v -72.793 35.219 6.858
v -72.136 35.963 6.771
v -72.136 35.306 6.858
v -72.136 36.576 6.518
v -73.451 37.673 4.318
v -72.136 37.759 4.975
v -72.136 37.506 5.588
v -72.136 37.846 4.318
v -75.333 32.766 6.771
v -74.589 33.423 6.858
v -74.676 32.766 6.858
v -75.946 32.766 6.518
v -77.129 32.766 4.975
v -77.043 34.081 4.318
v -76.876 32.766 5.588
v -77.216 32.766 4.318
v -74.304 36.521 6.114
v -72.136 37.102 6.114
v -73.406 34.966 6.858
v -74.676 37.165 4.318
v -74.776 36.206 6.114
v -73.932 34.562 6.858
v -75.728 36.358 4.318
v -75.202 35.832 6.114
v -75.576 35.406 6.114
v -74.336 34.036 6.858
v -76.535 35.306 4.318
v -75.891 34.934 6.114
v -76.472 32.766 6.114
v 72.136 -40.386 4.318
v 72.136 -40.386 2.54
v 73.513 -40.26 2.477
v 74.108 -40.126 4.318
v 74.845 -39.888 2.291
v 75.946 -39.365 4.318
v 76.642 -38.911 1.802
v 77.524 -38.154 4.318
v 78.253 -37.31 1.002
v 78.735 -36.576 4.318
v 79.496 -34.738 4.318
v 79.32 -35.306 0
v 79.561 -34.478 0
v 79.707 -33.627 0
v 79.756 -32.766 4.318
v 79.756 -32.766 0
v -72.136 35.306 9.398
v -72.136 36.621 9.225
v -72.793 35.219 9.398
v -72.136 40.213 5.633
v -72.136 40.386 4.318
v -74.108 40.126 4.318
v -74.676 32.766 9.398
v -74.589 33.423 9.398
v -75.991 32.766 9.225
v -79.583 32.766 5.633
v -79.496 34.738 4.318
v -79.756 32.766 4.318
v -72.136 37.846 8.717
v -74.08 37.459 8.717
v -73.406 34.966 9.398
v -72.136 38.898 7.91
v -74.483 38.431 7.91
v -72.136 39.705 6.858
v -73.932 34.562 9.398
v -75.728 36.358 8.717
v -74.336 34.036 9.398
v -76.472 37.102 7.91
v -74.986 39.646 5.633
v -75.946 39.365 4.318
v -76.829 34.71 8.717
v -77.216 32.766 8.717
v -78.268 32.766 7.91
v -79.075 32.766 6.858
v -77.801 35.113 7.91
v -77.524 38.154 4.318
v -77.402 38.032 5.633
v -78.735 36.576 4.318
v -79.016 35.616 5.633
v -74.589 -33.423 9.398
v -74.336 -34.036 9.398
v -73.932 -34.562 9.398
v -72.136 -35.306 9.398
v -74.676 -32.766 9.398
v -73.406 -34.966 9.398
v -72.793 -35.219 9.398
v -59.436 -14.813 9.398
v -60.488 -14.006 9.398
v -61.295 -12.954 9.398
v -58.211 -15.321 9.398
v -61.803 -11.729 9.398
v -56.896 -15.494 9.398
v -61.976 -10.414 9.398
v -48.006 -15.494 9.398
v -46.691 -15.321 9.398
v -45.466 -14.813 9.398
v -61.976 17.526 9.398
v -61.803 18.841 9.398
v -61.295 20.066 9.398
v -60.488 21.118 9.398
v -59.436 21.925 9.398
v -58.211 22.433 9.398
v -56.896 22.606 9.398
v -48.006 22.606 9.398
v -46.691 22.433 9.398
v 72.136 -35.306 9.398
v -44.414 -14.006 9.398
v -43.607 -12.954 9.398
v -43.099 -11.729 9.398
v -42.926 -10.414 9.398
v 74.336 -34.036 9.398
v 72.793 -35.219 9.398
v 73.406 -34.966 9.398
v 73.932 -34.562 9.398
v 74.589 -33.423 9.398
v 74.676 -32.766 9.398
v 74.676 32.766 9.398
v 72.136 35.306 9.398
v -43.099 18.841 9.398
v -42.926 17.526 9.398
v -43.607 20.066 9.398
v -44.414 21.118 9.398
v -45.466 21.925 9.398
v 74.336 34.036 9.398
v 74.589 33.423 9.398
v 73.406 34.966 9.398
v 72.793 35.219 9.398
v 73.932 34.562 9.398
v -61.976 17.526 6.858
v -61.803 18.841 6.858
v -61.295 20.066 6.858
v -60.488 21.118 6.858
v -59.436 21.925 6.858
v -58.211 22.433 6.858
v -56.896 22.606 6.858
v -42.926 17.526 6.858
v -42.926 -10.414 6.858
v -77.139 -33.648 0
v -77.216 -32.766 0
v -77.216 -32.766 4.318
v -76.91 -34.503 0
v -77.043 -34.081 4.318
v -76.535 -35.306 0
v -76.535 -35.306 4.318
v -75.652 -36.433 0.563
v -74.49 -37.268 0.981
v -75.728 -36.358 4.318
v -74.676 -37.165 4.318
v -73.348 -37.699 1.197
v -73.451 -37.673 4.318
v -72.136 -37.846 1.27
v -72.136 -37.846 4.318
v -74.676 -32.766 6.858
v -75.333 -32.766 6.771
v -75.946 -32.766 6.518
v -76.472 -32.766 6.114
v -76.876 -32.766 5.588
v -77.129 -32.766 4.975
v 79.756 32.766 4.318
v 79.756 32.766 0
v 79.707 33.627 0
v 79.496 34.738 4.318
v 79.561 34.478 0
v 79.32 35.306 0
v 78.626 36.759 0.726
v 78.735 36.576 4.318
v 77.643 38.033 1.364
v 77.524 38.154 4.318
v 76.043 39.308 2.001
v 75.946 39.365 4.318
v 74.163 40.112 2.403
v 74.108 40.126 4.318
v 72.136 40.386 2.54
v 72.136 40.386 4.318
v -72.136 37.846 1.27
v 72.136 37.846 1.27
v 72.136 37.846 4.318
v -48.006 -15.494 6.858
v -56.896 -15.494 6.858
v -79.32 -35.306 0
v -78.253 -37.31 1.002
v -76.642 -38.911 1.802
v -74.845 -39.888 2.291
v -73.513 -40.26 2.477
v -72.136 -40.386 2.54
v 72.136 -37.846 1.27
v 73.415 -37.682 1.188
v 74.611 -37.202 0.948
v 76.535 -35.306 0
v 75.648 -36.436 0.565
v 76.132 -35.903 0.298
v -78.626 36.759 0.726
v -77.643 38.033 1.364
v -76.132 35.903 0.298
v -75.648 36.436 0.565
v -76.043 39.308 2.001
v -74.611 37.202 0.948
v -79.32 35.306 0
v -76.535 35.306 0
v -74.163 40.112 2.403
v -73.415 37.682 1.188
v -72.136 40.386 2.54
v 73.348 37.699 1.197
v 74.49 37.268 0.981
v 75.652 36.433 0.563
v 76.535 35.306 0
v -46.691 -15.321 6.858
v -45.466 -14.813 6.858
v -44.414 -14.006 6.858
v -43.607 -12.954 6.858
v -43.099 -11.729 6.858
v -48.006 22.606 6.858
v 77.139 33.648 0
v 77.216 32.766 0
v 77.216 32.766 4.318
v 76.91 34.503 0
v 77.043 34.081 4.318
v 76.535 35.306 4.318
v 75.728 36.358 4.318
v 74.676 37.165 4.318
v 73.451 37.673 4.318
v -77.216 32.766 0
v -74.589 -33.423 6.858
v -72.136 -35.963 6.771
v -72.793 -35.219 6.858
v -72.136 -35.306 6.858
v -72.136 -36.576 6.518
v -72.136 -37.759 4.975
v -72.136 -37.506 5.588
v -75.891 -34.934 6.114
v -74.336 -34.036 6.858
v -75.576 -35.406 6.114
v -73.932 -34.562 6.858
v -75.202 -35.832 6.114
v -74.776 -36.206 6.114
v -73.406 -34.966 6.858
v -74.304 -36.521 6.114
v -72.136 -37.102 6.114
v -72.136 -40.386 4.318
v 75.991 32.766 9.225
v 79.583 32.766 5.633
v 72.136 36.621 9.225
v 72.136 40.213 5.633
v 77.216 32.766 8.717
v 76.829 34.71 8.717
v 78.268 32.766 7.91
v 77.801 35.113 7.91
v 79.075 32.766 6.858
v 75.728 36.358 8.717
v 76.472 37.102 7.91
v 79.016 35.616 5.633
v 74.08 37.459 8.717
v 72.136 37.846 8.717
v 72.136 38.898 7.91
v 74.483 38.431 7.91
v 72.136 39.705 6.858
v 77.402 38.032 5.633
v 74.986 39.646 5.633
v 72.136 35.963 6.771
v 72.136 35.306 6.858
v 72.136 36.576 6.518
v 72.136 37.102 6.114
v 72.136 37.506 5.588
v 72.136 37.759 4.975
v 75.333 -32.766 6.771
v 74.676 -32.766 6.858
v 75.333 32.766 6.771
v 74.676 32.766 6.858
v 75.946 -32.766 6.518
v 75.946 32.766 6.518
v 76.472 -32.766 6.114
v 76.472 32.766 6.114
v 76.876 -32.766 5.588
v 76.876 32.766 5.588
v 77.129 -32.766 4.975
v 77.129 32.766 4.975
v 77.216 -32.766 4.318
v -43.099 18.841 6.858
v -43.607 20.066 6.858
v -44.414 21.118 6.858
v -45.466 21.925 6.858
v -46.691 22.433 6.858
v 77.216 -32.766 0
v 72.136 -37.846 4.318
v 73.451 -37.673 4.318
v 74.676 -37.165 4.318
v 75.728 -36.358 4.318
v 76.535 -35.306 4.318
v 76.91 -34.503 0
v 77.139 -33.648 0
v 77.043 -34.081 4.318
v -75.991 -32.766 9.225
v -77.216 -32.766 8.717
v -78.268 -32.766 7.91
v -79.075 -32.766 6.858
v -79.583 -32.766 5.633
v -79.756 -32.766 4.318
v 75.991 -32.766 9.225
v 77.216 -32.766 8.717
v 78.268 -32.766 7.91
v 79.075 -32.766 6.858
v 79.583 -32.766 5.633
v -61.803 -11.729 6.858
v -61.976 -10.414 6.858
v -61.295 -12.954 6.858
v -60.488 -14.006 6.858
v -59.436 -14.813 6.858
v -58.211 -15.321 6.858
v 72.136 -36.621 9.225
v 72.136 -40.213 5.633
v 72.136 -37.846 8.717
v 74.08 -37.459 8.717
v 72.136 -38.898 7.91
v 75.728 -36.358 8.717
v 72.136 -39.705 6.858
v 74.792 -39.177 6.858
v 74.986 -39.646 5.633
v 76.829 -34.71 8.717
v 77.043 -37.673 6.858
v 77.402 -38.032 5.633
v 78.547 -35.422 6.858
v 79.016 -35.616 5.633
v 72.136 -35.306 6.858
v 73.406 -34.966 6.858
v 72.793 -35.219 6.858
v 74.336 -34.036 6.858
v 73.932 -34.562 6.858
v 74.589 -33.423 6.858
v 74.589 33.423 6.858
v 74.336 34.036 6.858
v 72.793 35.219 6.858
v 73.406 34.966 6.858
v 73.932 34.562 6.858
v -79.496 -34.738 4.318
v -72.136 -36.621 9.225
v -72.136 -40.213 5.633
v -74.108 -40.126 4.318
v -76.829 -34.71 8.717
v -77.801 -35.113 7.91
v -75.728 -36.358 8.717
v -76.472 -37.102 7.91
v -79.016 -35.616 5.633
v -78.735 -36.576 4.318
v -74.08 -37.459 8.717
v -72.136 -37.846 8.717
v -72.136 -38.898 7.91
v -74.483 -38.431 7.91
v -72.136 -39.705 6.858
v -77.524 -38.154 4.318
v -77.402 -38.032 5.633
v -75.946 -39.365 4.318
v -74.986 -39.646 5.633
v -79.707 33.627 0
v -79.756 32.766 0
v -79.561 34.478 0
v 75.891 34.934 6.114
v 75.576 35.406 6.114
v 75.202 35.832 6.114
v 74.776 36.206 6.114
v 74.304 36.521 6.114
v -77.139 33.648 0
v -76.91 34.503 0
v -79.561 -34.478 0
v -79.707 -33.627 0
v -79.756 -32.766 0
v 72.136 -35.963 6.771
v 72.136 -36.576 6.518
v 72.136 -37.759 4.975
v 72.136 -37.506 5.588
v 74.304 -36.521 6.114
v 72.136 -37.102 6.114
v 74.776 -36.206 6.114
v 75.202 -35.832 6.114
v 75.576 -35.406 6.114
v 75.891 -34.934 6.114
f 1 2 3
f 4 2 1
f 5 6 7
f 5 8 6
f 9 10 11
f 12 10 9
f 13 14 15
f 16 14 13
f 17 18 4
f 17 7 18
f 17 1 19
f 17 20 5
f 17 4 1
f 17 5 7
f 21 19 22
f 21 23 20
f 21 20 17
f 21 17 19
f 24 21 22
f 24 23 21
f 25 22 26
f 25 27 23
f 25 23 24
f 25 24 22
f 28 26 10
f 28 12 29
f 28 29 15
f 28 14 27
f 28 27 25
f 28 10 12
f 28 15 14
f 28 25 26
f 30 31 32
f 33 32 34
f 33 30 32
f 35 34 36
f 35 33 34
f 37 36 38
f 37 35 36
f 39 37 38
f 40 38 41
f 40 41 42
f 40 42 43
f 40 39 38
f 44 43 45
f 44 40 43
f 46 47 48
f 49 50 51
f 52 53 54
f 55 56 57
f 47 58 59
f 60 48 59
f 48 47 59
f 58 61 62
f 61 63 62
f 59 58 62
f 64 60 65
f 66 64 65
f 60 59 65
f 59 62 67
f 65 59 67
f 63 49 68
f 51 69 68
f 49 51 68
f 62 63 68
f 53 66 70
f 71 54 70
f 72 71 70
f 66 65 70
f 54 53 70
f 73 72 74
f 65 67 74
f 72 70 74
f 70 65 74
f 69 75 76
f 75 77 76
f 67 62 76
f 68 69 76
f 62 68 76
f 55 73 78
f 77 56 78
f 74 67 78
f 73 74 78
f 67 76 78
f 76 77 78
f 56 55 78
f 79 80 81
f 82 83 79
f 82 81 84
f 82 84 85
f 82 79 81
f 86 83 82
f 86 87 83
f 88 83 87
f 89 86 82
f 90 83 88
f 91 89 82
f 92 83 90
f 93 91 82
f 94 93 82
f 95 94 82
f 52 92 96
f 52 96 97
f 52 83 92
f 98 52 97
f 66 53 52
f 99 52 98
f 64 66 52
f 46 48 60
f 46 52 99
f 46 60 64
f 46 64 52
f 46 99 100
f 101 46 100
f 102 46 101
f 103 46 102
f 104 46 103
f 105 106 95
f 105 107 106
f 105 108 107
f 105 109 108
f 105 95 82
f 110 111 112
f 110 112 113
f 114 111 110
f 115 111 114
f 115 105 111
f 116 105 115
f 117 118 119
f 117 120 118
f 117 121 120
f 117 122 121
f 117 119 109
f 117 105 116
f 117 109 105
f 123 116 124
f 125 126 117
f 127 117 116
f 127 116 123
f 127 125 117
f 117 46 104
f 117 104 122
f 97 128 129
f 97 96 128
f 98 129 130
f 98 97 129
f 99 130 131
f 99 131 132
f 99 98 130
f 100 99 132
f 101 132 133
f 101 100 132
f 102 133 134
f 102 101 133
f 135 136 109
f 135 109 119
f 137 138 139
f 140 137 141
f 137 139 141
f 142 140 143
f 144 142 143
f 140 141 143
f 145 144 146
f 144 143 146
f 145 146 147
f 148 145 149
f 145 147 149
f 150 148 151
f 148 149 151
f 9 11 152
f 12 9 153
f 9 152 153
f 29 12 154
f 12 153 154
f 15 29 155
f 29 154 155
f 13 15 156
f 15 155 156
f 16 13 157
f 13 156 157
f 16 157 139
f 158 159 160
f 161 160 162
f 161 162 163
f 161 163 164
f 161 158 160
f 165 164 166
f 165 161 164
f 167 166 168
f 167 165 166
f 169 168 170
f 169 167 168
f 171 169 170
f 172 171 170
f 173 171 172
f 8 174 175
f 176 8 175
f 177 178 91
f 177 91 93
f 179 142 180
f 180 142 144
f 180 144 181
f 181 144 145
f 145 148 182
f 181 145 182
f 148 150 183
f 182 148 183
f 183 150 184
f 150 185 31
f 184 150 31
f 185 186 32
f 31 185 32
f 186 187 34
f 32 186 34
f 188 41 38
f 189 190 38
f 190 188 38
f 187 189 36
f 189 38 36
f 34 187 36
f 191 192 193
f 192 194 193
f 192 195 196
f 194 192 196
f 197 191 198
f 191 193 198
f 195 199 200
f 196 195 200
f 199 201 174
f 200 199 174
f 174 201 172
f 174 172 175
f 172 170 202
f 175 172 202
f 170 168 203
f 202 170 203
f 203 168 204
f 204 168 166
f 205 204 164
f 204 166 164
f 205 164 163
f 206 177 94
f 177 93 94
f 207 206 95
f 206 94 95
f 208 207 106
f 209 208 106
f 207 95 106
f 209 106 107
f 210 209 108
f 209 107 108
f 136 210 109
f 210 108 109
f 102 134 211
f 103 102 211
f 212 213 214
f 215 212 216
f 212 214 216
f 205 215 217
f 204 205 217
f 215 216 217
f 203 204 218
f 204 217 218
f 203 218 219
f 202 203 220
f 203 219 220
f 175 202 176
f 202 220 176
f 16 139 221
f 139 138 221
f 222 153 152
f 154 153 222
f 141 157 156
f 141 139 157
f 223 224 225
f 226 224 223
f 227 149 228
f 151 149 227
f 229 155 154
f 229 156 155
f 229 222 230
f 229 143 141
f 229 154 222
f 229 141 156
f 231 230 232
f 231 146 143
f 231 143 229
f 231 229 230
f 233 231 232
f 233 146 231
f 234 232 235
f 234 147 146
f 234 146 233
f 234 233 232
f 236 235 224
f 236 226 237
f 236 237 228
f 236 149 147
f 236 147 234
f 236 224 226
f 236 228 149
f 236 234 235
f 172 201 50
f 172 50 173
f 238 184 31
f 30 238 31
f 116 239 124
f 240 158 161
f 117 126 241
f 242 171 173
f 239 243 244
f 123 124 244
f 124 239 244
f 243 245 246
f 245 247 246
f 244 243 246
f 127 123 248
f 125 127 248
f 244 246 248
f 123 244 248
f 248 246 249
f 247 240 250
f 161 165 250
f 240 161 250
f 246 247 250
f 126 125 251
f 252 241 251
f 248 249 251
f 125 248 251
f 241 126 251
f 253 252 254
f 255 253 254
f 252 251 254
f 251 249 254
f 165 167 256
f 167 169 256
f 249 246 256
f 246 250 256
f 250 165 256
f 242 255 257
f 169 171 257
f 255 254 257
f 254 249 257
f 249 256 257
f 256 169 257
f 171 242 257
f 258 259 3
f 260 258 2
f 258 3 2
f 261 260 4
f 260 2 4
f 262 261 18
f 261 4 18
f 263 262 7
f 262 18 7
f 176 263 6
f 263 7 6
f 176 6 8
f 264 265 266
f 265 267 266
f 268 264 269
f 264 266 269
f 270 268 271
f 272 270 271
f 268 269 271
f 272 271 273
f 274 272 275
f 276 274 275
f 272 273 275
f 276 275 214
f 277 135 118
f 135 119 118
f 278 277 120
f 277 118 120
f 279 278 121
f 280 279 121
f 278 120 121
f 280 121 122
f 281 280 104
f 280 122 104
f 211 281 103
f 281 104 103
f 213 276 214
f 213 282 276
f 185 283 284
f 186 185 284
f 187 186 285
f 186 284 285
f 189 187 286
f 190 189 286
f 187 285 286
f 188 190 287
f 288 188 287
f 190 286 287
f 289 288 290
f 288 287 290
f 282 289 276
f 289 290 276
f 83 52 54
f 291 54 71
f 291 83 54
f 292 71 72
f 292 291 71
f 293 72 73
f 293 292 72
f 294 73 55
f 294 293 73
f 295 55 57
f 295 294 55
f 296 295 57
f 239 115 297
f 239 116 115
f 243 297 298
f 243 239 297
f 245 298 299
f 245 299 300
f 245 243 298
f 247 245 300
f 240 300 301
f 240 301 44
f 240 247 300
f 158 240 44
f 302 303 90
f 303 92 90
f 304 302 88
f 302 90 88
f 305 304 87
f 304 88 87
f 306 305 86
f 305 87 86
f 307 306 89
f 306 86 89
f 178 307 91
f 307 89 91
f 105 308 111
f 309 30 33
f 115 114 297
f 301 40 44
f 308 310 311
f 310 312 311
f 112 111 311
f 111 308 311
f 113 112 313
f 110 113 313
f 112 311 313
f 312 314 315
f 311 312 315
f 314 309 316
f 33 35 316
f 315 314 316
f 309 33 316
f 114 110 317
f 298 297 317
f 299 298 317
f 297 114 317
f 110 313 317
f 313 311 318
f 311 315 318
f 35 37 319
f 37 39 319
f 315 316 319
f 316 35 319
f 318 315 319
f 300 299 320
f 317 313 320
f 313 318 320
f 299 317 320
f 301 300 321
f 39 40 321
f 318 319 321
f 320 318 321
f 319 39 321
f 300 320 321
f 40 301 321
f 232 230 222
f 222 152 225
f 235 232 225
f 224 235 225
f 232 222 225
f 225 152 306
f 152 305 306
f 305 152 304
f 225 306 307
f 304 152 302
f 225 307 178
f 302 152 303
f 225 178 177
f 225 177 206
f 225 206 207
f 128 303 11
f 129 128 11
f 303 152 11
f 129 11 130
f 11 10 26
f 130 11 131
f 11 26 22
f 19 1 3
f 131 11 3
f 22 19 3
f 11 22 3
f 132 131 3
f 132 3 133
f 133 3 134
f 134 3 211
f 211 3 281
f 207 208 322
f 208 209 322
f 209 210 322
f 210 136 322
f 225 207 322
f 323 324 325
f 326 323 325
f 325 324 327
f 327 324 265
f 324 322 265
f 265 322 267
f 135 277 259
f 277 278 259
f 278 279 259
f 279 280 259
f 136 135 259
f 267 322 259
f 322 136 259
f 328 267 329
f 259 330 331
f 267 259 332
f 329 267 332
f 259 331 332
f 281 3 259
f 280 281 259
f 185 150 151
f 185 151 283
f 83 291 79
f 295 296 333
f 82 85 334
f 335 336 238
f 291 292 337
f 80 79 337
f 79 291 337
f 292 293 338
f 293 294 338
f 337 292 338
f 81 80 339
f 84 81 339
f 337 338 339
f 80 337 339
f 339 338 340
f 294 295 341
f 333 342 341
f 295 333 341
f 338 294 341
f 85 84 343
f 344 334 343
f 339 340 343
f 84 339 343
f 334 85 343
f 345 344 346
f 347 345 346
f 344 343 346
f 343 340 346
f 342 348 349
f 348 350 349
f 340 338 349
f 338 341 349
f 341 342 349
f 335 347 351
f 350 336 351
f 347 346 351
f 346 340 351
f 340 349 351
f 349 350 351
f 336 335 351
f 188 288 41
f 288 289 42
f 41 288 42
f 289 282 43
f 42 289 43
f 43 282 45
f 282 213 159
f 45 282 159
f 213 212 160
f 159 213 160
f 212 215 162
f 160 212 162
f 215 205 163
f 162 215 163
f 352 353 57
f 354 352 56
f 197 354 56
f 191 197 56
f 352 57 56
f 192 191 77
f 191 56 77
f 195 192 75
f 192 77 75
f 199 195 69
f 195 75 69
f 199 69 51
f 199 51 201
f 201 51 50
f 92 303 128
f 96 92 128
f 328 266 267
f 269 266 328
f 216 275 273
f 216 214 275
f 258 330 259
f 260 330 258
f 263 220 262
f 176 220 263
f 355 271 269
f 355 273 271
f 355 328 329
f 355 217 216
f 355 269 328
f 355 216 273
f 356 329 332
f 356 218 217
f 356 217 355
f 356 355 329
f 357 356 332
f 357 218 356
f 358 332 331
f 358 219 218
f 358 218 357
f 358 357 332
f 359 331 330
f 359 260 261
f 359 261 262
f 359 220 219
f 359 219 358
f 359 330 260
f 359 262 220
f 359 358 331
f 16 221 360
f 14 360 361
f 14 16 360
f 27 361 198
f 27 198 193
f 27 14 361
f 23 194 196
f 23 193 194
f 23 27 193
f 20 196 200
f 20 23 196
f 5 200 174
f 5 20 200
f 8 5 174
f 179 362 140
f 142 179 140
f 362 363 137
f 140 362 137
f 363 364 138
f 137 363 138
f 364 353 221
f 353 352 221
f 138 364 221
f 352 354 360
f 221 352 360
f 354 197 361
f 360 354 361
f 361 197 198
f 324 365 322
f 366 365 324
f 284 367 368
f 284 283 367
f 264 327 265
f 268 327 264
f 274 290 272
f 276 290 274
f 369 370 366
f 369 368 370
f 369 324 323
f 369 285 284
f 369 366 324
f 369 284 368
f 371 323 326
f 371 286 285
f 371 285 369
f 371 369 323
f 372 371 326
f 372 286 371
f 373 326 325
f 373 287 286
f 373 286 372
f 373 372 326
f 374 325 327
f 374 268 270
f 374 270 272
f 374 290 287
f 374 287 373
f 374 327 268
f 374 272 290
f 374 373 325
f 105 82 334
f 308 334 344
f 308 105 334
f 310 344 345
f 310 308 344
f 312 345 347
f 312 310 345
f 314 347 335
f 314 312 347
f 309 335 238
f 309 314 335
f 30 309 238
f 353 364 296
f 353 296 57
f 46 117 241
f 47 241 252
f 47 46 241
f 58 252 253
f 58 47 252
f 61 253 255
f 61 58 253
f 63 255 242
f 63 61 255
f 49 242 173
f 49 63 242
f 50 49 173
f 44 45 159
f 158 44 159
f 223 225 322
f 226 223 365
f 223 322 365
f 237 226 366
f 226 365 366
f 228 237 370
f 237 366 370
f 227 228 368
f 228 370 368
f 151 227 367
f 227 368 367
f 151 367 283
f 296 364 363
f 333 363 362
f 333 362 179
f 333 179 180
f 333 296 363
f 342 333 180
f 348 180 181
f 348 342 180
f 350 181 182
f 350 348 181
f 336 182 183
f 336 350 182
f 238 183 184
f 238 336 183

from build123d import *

# Parameters (mm, degrees)
F0_W          = 159.512
F0_H          = 80.772
F1_DEPTH      = 9.398
F2_R          = 7.62
F3_R          = 5.08
F5_DEPTH      = 79.757
F5_DEPTH_BACK = 79.757
F6_T          = -2.54
F7_W          = 19.05
F7_H          = 38.1
F8_DEPTH      = 30.48
F9_R          = 5.08


with BuildPart() as f1:
    # F0 (on Top) → F1 (new body)
    with BuildSketch(Plane.XY):
        Rectangle(F0_W, F0_H)
    extrude(amount=F1_DEPTH)

    # F2
    f2_edges = [f1.edges().sort_by_distance(p)[0] for p in [
        (79.756, -40.386, 4.699),
        (79.756, 40.386, 4.699),
        (-79.756, -40.386, 4.699),
        (-79.756, 40.386, 4.699),
    ]]
    fillet(f2_edges, radius=F2_R)

    # F3
    f3_edges = [f1.edges().sort_by_distance(p)[0] for p in [
        (79.756, 0, 9.398),
        (77.524154, -38.154154, 9.398),
        (77.524154, 38.154154, 9.398),
        (0, -40.386, 9.398),
        (0, 40.386, 9.398),
        (-77.524154, -38.154154, 9.398),
        (-77.524154, 38.154154, 9.398),
        (-79.756, 0, 9.398),
    ]]
    fillet(f3_edges, radius=F3_R)

    # F4 (on Right) → F5 (cut, two sides)
    with BuildSketch(Plane.YZ) as f5_sk:
        Polygon((35.306, 0), (40.386, 0), (40.386, 2.54), align=None)
        Polygon((-40.386, 0), (-35.306, 0), (-40.386, 2.54), align=None)
    extrude(amount=F5_DEPTH, mode=Mode.SUBTRACT)
    extrude(f5_sk.sketch, amount=-F5_DEPTH_BACK, mode=Mode.SUBTRACT)

    # F6
    f6_openings = [f1.faces().sort_by_distance(p)[0] for p in [
        (0, -37.816494, 1.255247),
        (0, 37.816494, 1.255247),
        (0, 0, 0),
    ]]
    offset(amount=F6_T, openings=f6_openings)

    # F7 (on Top) → F8 (cut)
    with BuildSketch(Plane.XY):
        with Locations((-52.451, 3.556)):
            Rectangle(F7_W, F7_H)
    extrude(amount=F8_DEPTH, mode=Mode.SUBTRACT)

    # F9
    f9_edges = [f1.edges().sort_by_distance(p)[0] for p in [
        (-61.976, -15.494, 8.128),
        (-42.926, -15.494, 8.128),
        (-61.976, 22.606, 8.128),
        (-42.926, 22.606, 8.128),
    ]]
    fillet(f9_edges, radius=F9_R)


solid = f1.part
